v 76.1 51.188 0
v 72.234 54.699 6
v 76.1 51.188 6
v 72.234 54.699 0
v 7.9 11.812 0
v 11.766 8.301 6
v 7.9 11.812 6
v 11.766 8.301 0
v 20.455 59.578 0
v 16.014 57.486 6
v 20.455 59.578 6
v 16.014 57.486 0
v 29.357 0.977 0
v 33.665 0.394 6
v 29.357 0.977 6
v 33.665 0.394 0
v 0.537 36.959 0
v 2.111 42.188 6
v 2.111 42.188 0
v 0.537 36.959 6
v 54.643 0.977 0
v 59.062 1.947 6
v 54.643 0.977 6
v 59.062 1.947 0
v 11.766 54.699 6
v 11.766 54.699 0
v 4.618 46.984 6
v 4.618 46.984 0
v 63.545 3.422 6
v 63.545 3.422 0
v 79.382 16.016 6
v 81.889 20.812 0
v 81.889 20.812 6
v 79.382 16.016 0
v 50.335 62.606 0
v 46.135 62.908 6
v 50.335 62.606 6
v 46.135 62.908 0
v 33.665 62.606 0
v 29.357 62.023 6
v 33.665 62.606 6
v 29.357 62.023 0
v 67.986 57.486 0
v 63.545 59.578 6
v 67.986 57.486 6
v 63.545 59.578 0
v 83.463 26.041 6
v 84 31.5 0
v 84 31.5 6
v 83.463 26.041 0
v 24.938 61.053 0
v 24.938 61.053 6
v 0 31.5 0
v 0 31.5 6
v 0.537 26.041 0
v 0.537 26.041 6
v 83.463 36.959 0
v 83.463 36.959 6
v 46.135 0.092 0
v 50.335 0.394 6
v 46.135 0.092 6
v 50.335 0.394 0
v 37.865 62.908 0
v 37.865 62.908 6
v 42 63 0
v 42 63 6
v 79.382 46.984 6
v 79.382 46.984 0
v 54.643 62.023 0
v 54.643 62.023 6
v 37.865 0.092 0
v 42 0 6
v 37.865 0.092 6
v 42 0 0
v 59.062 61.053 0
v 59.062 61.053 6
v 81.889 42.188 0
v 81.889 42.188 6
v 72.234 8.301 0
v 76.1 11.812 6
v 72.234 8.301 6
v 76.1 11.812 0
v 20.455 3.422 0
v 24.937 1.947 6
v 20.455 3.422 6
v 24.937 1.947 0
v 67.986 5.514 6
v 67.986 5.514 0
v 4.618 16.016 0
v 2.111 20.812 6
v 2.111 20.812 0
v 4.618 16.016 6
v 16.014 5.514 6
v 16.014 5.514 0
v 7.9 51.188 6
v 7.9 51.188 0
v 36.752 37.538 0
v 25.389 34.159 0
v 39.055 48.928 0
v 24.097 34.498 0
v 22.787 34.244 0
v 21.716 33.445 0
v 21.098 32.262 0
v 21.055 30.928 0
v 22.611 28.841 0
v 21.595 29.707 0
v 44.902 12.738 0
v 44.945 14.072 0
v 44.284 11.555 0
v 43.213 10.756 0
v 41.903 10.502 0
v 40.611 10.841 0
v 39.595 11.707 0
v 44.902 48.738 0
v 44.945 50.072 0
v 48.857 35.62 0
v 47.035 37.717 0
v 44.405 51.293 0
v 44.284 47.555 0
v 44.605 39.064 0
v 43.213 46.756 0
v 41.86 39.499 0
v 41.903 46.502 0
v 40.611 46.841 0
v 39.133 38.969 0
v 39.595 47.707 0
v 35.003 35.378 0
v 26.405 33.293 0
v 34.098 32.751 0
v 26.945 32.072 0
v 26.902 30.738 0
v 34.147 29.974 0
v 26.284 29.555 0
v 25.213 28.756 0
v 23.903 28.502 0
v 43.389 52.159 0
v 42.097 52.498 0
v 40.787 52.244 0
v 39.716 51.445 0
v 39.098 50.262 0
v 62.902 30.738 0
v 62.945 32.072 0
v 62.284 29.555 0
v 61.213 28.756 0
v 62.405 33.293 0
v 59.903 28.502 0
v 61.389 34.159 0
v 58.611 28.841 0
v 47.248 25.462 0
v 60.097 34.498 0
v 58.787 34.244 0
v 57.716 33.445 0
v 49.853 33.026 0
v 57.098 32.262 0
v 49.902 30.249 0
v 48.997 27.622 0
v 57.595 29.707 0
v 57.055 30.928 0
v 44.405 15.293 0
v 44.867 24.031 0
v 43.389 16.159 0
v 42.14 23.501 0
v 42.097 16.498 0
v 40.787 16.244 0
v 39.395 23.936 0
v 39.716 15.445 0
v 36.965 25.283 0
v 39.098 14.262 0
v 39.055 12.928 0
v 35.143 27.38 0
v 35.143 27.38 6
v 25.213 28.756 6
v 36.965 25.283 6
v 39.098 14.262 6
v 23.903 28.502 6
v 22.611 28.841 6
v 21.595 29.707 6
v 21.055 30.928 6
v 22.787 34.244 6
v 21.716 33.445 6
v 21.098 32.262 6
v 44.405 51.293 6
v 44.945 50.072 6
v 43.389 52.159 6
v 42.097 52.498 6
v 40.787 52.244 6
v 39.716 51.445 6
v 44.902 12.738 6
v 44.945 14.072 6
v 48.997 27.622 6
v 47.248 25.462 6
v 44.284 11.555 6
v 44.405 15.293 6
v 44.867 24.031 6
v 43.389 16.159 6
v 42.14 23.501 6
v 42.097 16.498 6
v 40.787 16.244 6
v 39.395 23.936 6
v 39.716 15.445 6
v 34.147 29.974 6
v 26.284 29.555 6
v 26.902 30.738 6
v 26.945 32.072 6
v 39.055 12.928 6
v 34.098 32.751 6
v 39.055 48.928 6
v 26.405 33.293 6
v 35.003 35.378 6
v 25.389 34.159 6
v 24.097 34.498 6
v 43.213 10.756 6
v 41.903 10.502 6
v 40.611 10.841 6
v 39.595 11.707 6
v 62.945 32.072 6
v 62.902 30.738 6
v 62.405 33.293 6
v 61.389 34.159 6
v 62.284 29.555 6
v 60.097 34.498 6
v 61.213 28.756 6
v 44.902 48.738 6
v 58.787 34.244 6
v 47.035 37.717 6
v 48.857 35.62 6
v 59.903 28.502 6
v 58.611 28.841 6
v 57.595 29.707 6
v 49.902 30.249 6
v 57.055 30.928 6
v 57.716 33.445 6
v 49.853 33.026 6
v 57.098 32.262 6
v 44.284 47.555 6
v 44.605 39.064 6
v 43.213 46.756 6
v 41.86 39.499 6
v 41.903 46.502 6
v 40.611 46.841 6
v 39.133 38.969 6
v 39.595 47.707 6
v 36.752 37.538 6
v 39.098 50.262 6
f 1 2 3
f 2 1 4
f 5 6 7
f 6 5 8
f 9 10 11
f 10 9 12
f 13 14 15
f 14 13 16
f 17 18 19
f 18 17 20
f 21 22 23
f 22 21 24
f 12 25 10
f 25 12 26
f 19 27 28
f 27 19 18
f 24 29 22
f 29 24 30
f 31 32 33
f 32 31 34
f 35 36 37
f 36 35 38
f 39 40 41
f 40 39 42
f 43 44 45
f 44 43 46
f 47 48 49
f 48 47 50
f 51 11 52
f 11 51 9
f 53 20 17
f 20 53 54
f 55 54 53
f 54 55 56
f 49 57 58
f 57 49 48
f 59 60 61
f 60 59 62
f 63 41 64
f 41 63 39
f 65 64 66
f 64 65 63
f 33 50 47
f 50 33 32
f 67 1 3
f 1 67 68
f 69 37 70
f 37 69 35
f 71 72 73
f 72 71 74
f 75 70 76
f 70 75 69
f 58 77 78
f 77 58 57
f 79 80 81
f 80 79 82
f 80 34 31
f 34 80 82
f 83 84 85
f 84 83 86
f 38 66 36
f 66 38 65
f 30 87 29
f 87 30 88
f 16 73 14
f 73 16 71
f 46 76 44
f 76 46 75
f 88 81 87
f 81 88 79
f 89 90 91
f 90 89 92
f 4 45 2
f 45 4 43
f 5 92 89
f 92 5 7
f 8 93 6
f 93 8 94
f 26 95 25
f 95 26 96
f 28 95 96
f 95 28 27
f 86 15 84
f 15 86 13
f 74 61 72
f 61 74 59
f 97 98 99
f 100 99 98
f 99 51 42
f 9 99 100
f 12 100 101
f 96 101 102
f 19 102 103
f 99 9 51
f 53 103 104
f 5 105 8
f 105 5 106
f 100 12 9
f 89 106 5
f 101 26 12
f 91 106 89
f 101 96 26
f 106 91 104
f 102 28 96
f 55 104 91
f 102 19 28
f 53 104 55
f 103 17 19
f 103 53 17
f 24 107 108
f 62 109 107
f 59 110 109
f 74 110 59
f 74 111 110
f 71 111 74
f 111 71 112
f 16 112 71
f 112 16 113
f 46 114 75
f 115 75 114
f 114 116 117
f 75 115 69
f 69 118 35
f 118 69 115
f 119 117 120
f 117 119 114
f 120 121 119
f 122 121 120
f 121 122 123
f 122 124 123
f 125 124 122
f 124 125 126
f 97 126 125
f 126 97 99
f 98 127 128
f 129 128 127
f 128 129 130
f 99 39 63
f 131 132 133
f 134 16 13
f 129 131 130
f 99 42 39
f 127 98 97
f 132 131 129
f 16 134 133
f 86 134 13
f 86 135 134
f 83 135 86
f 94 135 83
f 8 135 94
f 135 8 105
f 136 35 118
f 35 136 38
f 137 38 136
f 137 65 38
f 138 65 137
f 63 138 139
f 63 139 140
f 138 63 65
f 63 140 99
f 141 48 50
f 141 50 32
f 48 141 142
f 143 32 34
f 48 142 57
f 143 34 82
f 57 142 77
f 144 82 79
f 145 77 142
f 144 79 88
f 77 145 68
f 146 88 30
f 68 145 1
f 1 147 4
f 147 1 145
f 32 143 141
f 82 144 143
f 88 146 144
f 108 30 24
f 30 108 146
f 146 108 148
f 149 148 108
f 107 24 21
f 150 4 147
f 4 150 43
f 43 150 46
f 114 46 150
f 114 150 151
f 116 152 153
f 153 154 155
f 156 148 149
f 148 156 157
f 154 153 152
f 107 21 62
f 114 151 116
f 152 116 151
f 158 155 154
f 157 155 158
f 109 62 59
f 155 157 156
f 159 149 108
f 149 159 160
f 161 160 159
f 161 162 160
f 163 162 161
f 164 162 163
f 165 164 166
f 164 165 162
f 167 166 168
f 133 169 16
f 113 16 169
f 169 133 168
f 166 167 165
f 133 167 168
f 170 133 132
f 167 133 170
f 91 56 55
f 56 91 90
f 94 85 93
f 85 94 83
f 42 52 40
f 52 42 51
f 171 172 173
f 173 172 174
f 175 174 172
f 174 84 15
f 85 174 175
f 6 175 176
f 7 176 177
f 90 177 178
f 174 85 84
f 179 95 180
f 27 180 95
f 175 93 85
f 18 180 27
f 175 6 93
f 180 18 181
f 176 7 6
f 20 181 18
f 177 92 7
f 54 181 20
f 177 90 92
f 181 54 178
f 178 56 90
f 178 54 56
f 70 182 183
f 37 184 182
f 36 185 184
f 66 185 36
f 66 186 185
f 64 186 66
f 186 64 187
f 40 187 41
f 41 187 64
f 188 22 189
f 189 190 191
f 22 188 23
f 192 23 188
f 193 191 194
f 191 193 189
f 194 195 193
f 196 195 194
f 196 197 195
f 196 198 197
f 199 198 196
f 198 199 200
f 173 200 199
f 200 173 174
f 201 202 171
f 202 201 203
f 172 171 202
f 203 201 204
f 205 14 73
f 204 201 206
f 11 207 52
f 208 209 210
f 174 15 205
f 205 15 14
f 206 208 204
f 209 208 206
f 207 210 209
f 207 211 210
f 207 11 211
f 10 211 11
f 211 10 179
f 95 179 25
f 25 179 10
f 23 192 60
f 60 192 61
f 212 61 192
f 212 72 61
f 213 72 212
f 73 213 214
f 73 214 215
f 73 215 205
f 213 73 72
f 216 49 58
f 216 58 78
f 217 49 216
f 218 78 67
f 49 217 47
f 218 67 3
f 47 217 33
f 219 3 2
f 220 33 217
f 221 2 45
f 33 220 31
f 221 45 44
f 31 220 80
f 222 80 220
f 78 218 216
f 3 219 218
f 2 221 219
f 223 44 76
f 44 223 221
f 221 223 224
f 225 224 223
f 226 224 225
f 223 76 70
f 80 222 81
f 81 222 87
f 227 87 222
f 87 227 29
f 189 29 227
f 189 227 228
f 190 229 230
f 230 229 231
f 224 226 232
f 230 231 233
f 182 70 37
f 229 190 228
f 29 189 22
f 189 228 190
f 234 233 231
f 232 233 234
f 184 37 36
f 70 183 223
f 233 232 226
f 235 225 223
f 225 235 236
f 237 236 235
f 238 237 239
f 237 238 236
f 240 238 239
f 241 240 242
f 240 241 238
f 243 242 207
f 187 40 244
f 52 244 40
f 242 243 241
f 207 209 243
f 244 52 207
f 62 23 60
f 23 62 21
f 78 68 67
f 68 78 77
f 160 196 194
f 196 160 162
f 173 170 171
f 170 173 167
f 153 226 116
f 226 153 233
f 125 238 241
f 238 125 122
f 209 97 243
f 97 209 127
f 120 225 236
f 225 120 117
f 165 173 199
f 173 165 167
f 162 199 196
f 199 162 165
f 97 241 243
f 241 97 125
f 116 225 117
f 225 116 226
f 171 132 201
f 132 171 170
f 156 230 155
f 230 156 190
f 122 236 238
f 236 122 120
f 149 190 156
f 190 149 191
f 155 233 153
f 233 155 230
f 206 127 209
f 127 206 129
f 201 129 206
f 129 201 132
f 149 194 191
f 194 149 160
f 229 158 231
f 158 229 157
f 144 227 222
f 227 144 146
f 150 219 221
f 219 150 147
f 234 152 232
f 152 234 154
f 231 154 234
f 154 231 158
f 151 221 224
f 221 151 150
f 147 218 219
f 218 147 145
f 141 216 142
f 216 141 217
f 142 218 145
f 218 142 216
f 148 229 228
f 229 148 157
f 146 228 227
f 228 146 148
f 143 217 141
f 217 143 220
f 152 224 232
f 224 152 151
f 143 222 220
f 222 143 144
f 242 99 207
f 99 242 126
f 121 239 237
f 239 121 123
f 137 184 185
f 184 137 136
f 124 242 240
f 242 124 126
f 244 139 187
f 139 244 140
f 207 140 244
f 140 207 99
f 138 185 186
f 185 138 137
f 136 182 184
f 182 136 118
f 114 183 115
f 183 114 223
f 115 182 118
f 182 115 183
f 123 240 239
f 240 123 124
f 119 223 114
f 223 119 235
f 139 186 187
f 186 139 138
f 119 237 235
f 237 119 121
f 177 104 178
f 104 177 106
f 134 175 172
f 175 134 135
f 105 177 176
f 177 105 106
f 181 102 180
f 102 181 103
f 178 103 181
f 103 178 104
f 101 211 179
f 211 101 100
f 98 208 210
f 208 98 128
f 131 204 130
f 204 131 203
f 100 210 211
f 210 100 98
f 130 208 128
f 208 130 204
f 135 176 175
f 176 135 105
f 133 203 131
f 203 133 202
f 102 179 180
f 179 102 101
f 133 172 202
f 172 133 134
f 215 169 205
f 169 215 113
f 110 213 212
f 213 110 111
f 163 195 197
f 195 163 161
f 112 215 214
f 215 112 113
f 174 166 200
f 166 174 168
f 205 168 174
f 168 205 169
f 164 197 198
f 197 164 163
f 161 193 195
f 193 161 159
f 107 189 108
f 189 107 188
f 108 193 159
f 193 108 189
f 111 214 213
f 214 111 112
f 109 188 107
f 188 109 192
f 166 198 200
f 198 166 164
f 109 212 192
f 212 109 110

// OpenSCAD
$fn = 32;

// ----------------------------------------------------------------------
// Cam plate: double_lobe cam, base R28
// ----------------------------------------------------------------------

// --- parameters (mm) ---
base_r = 28;              // base circle radius
lobe_h = 14;              // cam lobe rise
bore_r = 8;               // shaft bore radius
plate_t = 6;              // plate thickness, Z (extrusion height)
ring_r = 18;              // lightening ring radius
bolt_r = 3;               // lightening hole radius

profile = [[84, 31.5], [83.463, 36.959], [81.889, 42.188], [79.382, 46.984], [76.1, 51.188], [72.234, 54.699], [67.986, 57.486], [63.545, 59.578], [59.062, 61.053], [54.643, 62.023], [50.335, 62.606], [46.135, 62.908], [42, 63], [37.865, 62.908], [33.665, 62.606], [29.357, 62.023], [24.938, 61.053], [20.455, 59.578], [16.014, 57.486], [11.766, 54.699], [7.9, 51.188], [4.618, 46.984], [2.111, 42.188], [0.537, 36.959], [0, 31.5], [0.537, 26.041], [2.111, 20.812], [4.618, 16.016], [7.9, 11.812], [11.766, 8.301], [16.014, 5.514], [20.455, 3.422], [24.937, 1.947], [29.357, 0.977], [33.665, 0.394], [37.865, 0.092], [42, 0], [46.135, 0.092], [50.335, 0.394], [54.643, 0.977], [59.062, 1.947], [63.545, 3.422], [67.986, 5.514], [72.234, 8.301], [76.1, 11.812], [79.382, 16.016], [81.889, 20.812], [83.463, 26.041]];  // primary outline, 48 points, counter clockwise
void_1 = [[49.853, 33.026], [48.857, 35.62], [47.035, 37.717], [44.605, 39.064], [41.86, 39.499], [39.133, 38.969], [36.752, 37.538], [35.003, 35.378], [34.098, 32.751], [34.147, 29.974], [35.143, 27.38], [36.965, 25.283], [39.395, 23.936], [42.14, 23.501], [44.867, 24.031], [47.248, 25.462], [48.997, 27.622], [49.902, 30.249]];  // shaft bore, 18 points
void_2 = [[62.945, 32.072], [62.405, 33.293], [61.389, 34.159], [60.097, 34.498], [58.787, 34.244], [57.716, 33.445], [57.098, 32.262], [57.055, 30.928], [57.595, 29.707], [58.611, 28.841], [59.903, 28.502], [61.213, 28.756], [62.284, 29.555], [62.902, 30.738]];  // lightening hole 1, 14 points
void_3 = [[44.945, 50.072], [44.405, 51.293], [43.389, 52.159], [42.097, 52.498], [40.787, 52.244], [39.716, 51.445], [39.098, 50.262], [39.055, 48.928], [39.595, 47.707], [40.611, 46.841], [41.903, 46.502], [43.213, 46.756], [44.284, 47.555], [44.902, 48.738]];  // lightening hole 2, 14 points
void_4 = [[26.945, 32.072], [26.405, 33.293], [25.389, 34.159], [24.097, 34.498], [22.787, 34.244], [21.716, 33.445], [21.098, 32.262], [21.055, 30.928], [21.595, 29.707], [22.611, 28.841], [23.903, 28.502], [25.213, 28.756], [26.284, 29.555], [26.902, 30.738]];  // lightening hole 3, 14 points
void_5 = [[44.945, 14.072], [44.405, 15.293], [43.389, 16.159], [42.097, 16.498], [40.787, 16.244], [39.716, 15.445], [39.098, 14.262], [39.055, 12.928], [39.595, 11.707], [40.611, 10.841], [41.903, 10.502], [43.213, 10.756], [44.284, 11.555], [44.902, 12.738]];  // lightening hole 4, 14 points

// --- the one profile operation ---
difference() {
  linear_extrude(height = plate_t) polygon(points = profile);
  translate([0, 0, -1])
    linear_extrude(height = plate_t + 2) polygon(points = void_1);
  translate([0, 0, -1])
    linear_extrude(height = plate_t + 2) polygon(points = void_2);
  translate([0, 0, -1])
    linear_extrude(height = plate_t + 2) polygon(points = void_3);
  translate([0, 0, -1])
    linear_extrude(height = plate_t + 2) polygon(points = void_4);
  translate([0, 0, -1])
    linear_extrude(height = plate_t + 2) polygon(points = void_5);
}
